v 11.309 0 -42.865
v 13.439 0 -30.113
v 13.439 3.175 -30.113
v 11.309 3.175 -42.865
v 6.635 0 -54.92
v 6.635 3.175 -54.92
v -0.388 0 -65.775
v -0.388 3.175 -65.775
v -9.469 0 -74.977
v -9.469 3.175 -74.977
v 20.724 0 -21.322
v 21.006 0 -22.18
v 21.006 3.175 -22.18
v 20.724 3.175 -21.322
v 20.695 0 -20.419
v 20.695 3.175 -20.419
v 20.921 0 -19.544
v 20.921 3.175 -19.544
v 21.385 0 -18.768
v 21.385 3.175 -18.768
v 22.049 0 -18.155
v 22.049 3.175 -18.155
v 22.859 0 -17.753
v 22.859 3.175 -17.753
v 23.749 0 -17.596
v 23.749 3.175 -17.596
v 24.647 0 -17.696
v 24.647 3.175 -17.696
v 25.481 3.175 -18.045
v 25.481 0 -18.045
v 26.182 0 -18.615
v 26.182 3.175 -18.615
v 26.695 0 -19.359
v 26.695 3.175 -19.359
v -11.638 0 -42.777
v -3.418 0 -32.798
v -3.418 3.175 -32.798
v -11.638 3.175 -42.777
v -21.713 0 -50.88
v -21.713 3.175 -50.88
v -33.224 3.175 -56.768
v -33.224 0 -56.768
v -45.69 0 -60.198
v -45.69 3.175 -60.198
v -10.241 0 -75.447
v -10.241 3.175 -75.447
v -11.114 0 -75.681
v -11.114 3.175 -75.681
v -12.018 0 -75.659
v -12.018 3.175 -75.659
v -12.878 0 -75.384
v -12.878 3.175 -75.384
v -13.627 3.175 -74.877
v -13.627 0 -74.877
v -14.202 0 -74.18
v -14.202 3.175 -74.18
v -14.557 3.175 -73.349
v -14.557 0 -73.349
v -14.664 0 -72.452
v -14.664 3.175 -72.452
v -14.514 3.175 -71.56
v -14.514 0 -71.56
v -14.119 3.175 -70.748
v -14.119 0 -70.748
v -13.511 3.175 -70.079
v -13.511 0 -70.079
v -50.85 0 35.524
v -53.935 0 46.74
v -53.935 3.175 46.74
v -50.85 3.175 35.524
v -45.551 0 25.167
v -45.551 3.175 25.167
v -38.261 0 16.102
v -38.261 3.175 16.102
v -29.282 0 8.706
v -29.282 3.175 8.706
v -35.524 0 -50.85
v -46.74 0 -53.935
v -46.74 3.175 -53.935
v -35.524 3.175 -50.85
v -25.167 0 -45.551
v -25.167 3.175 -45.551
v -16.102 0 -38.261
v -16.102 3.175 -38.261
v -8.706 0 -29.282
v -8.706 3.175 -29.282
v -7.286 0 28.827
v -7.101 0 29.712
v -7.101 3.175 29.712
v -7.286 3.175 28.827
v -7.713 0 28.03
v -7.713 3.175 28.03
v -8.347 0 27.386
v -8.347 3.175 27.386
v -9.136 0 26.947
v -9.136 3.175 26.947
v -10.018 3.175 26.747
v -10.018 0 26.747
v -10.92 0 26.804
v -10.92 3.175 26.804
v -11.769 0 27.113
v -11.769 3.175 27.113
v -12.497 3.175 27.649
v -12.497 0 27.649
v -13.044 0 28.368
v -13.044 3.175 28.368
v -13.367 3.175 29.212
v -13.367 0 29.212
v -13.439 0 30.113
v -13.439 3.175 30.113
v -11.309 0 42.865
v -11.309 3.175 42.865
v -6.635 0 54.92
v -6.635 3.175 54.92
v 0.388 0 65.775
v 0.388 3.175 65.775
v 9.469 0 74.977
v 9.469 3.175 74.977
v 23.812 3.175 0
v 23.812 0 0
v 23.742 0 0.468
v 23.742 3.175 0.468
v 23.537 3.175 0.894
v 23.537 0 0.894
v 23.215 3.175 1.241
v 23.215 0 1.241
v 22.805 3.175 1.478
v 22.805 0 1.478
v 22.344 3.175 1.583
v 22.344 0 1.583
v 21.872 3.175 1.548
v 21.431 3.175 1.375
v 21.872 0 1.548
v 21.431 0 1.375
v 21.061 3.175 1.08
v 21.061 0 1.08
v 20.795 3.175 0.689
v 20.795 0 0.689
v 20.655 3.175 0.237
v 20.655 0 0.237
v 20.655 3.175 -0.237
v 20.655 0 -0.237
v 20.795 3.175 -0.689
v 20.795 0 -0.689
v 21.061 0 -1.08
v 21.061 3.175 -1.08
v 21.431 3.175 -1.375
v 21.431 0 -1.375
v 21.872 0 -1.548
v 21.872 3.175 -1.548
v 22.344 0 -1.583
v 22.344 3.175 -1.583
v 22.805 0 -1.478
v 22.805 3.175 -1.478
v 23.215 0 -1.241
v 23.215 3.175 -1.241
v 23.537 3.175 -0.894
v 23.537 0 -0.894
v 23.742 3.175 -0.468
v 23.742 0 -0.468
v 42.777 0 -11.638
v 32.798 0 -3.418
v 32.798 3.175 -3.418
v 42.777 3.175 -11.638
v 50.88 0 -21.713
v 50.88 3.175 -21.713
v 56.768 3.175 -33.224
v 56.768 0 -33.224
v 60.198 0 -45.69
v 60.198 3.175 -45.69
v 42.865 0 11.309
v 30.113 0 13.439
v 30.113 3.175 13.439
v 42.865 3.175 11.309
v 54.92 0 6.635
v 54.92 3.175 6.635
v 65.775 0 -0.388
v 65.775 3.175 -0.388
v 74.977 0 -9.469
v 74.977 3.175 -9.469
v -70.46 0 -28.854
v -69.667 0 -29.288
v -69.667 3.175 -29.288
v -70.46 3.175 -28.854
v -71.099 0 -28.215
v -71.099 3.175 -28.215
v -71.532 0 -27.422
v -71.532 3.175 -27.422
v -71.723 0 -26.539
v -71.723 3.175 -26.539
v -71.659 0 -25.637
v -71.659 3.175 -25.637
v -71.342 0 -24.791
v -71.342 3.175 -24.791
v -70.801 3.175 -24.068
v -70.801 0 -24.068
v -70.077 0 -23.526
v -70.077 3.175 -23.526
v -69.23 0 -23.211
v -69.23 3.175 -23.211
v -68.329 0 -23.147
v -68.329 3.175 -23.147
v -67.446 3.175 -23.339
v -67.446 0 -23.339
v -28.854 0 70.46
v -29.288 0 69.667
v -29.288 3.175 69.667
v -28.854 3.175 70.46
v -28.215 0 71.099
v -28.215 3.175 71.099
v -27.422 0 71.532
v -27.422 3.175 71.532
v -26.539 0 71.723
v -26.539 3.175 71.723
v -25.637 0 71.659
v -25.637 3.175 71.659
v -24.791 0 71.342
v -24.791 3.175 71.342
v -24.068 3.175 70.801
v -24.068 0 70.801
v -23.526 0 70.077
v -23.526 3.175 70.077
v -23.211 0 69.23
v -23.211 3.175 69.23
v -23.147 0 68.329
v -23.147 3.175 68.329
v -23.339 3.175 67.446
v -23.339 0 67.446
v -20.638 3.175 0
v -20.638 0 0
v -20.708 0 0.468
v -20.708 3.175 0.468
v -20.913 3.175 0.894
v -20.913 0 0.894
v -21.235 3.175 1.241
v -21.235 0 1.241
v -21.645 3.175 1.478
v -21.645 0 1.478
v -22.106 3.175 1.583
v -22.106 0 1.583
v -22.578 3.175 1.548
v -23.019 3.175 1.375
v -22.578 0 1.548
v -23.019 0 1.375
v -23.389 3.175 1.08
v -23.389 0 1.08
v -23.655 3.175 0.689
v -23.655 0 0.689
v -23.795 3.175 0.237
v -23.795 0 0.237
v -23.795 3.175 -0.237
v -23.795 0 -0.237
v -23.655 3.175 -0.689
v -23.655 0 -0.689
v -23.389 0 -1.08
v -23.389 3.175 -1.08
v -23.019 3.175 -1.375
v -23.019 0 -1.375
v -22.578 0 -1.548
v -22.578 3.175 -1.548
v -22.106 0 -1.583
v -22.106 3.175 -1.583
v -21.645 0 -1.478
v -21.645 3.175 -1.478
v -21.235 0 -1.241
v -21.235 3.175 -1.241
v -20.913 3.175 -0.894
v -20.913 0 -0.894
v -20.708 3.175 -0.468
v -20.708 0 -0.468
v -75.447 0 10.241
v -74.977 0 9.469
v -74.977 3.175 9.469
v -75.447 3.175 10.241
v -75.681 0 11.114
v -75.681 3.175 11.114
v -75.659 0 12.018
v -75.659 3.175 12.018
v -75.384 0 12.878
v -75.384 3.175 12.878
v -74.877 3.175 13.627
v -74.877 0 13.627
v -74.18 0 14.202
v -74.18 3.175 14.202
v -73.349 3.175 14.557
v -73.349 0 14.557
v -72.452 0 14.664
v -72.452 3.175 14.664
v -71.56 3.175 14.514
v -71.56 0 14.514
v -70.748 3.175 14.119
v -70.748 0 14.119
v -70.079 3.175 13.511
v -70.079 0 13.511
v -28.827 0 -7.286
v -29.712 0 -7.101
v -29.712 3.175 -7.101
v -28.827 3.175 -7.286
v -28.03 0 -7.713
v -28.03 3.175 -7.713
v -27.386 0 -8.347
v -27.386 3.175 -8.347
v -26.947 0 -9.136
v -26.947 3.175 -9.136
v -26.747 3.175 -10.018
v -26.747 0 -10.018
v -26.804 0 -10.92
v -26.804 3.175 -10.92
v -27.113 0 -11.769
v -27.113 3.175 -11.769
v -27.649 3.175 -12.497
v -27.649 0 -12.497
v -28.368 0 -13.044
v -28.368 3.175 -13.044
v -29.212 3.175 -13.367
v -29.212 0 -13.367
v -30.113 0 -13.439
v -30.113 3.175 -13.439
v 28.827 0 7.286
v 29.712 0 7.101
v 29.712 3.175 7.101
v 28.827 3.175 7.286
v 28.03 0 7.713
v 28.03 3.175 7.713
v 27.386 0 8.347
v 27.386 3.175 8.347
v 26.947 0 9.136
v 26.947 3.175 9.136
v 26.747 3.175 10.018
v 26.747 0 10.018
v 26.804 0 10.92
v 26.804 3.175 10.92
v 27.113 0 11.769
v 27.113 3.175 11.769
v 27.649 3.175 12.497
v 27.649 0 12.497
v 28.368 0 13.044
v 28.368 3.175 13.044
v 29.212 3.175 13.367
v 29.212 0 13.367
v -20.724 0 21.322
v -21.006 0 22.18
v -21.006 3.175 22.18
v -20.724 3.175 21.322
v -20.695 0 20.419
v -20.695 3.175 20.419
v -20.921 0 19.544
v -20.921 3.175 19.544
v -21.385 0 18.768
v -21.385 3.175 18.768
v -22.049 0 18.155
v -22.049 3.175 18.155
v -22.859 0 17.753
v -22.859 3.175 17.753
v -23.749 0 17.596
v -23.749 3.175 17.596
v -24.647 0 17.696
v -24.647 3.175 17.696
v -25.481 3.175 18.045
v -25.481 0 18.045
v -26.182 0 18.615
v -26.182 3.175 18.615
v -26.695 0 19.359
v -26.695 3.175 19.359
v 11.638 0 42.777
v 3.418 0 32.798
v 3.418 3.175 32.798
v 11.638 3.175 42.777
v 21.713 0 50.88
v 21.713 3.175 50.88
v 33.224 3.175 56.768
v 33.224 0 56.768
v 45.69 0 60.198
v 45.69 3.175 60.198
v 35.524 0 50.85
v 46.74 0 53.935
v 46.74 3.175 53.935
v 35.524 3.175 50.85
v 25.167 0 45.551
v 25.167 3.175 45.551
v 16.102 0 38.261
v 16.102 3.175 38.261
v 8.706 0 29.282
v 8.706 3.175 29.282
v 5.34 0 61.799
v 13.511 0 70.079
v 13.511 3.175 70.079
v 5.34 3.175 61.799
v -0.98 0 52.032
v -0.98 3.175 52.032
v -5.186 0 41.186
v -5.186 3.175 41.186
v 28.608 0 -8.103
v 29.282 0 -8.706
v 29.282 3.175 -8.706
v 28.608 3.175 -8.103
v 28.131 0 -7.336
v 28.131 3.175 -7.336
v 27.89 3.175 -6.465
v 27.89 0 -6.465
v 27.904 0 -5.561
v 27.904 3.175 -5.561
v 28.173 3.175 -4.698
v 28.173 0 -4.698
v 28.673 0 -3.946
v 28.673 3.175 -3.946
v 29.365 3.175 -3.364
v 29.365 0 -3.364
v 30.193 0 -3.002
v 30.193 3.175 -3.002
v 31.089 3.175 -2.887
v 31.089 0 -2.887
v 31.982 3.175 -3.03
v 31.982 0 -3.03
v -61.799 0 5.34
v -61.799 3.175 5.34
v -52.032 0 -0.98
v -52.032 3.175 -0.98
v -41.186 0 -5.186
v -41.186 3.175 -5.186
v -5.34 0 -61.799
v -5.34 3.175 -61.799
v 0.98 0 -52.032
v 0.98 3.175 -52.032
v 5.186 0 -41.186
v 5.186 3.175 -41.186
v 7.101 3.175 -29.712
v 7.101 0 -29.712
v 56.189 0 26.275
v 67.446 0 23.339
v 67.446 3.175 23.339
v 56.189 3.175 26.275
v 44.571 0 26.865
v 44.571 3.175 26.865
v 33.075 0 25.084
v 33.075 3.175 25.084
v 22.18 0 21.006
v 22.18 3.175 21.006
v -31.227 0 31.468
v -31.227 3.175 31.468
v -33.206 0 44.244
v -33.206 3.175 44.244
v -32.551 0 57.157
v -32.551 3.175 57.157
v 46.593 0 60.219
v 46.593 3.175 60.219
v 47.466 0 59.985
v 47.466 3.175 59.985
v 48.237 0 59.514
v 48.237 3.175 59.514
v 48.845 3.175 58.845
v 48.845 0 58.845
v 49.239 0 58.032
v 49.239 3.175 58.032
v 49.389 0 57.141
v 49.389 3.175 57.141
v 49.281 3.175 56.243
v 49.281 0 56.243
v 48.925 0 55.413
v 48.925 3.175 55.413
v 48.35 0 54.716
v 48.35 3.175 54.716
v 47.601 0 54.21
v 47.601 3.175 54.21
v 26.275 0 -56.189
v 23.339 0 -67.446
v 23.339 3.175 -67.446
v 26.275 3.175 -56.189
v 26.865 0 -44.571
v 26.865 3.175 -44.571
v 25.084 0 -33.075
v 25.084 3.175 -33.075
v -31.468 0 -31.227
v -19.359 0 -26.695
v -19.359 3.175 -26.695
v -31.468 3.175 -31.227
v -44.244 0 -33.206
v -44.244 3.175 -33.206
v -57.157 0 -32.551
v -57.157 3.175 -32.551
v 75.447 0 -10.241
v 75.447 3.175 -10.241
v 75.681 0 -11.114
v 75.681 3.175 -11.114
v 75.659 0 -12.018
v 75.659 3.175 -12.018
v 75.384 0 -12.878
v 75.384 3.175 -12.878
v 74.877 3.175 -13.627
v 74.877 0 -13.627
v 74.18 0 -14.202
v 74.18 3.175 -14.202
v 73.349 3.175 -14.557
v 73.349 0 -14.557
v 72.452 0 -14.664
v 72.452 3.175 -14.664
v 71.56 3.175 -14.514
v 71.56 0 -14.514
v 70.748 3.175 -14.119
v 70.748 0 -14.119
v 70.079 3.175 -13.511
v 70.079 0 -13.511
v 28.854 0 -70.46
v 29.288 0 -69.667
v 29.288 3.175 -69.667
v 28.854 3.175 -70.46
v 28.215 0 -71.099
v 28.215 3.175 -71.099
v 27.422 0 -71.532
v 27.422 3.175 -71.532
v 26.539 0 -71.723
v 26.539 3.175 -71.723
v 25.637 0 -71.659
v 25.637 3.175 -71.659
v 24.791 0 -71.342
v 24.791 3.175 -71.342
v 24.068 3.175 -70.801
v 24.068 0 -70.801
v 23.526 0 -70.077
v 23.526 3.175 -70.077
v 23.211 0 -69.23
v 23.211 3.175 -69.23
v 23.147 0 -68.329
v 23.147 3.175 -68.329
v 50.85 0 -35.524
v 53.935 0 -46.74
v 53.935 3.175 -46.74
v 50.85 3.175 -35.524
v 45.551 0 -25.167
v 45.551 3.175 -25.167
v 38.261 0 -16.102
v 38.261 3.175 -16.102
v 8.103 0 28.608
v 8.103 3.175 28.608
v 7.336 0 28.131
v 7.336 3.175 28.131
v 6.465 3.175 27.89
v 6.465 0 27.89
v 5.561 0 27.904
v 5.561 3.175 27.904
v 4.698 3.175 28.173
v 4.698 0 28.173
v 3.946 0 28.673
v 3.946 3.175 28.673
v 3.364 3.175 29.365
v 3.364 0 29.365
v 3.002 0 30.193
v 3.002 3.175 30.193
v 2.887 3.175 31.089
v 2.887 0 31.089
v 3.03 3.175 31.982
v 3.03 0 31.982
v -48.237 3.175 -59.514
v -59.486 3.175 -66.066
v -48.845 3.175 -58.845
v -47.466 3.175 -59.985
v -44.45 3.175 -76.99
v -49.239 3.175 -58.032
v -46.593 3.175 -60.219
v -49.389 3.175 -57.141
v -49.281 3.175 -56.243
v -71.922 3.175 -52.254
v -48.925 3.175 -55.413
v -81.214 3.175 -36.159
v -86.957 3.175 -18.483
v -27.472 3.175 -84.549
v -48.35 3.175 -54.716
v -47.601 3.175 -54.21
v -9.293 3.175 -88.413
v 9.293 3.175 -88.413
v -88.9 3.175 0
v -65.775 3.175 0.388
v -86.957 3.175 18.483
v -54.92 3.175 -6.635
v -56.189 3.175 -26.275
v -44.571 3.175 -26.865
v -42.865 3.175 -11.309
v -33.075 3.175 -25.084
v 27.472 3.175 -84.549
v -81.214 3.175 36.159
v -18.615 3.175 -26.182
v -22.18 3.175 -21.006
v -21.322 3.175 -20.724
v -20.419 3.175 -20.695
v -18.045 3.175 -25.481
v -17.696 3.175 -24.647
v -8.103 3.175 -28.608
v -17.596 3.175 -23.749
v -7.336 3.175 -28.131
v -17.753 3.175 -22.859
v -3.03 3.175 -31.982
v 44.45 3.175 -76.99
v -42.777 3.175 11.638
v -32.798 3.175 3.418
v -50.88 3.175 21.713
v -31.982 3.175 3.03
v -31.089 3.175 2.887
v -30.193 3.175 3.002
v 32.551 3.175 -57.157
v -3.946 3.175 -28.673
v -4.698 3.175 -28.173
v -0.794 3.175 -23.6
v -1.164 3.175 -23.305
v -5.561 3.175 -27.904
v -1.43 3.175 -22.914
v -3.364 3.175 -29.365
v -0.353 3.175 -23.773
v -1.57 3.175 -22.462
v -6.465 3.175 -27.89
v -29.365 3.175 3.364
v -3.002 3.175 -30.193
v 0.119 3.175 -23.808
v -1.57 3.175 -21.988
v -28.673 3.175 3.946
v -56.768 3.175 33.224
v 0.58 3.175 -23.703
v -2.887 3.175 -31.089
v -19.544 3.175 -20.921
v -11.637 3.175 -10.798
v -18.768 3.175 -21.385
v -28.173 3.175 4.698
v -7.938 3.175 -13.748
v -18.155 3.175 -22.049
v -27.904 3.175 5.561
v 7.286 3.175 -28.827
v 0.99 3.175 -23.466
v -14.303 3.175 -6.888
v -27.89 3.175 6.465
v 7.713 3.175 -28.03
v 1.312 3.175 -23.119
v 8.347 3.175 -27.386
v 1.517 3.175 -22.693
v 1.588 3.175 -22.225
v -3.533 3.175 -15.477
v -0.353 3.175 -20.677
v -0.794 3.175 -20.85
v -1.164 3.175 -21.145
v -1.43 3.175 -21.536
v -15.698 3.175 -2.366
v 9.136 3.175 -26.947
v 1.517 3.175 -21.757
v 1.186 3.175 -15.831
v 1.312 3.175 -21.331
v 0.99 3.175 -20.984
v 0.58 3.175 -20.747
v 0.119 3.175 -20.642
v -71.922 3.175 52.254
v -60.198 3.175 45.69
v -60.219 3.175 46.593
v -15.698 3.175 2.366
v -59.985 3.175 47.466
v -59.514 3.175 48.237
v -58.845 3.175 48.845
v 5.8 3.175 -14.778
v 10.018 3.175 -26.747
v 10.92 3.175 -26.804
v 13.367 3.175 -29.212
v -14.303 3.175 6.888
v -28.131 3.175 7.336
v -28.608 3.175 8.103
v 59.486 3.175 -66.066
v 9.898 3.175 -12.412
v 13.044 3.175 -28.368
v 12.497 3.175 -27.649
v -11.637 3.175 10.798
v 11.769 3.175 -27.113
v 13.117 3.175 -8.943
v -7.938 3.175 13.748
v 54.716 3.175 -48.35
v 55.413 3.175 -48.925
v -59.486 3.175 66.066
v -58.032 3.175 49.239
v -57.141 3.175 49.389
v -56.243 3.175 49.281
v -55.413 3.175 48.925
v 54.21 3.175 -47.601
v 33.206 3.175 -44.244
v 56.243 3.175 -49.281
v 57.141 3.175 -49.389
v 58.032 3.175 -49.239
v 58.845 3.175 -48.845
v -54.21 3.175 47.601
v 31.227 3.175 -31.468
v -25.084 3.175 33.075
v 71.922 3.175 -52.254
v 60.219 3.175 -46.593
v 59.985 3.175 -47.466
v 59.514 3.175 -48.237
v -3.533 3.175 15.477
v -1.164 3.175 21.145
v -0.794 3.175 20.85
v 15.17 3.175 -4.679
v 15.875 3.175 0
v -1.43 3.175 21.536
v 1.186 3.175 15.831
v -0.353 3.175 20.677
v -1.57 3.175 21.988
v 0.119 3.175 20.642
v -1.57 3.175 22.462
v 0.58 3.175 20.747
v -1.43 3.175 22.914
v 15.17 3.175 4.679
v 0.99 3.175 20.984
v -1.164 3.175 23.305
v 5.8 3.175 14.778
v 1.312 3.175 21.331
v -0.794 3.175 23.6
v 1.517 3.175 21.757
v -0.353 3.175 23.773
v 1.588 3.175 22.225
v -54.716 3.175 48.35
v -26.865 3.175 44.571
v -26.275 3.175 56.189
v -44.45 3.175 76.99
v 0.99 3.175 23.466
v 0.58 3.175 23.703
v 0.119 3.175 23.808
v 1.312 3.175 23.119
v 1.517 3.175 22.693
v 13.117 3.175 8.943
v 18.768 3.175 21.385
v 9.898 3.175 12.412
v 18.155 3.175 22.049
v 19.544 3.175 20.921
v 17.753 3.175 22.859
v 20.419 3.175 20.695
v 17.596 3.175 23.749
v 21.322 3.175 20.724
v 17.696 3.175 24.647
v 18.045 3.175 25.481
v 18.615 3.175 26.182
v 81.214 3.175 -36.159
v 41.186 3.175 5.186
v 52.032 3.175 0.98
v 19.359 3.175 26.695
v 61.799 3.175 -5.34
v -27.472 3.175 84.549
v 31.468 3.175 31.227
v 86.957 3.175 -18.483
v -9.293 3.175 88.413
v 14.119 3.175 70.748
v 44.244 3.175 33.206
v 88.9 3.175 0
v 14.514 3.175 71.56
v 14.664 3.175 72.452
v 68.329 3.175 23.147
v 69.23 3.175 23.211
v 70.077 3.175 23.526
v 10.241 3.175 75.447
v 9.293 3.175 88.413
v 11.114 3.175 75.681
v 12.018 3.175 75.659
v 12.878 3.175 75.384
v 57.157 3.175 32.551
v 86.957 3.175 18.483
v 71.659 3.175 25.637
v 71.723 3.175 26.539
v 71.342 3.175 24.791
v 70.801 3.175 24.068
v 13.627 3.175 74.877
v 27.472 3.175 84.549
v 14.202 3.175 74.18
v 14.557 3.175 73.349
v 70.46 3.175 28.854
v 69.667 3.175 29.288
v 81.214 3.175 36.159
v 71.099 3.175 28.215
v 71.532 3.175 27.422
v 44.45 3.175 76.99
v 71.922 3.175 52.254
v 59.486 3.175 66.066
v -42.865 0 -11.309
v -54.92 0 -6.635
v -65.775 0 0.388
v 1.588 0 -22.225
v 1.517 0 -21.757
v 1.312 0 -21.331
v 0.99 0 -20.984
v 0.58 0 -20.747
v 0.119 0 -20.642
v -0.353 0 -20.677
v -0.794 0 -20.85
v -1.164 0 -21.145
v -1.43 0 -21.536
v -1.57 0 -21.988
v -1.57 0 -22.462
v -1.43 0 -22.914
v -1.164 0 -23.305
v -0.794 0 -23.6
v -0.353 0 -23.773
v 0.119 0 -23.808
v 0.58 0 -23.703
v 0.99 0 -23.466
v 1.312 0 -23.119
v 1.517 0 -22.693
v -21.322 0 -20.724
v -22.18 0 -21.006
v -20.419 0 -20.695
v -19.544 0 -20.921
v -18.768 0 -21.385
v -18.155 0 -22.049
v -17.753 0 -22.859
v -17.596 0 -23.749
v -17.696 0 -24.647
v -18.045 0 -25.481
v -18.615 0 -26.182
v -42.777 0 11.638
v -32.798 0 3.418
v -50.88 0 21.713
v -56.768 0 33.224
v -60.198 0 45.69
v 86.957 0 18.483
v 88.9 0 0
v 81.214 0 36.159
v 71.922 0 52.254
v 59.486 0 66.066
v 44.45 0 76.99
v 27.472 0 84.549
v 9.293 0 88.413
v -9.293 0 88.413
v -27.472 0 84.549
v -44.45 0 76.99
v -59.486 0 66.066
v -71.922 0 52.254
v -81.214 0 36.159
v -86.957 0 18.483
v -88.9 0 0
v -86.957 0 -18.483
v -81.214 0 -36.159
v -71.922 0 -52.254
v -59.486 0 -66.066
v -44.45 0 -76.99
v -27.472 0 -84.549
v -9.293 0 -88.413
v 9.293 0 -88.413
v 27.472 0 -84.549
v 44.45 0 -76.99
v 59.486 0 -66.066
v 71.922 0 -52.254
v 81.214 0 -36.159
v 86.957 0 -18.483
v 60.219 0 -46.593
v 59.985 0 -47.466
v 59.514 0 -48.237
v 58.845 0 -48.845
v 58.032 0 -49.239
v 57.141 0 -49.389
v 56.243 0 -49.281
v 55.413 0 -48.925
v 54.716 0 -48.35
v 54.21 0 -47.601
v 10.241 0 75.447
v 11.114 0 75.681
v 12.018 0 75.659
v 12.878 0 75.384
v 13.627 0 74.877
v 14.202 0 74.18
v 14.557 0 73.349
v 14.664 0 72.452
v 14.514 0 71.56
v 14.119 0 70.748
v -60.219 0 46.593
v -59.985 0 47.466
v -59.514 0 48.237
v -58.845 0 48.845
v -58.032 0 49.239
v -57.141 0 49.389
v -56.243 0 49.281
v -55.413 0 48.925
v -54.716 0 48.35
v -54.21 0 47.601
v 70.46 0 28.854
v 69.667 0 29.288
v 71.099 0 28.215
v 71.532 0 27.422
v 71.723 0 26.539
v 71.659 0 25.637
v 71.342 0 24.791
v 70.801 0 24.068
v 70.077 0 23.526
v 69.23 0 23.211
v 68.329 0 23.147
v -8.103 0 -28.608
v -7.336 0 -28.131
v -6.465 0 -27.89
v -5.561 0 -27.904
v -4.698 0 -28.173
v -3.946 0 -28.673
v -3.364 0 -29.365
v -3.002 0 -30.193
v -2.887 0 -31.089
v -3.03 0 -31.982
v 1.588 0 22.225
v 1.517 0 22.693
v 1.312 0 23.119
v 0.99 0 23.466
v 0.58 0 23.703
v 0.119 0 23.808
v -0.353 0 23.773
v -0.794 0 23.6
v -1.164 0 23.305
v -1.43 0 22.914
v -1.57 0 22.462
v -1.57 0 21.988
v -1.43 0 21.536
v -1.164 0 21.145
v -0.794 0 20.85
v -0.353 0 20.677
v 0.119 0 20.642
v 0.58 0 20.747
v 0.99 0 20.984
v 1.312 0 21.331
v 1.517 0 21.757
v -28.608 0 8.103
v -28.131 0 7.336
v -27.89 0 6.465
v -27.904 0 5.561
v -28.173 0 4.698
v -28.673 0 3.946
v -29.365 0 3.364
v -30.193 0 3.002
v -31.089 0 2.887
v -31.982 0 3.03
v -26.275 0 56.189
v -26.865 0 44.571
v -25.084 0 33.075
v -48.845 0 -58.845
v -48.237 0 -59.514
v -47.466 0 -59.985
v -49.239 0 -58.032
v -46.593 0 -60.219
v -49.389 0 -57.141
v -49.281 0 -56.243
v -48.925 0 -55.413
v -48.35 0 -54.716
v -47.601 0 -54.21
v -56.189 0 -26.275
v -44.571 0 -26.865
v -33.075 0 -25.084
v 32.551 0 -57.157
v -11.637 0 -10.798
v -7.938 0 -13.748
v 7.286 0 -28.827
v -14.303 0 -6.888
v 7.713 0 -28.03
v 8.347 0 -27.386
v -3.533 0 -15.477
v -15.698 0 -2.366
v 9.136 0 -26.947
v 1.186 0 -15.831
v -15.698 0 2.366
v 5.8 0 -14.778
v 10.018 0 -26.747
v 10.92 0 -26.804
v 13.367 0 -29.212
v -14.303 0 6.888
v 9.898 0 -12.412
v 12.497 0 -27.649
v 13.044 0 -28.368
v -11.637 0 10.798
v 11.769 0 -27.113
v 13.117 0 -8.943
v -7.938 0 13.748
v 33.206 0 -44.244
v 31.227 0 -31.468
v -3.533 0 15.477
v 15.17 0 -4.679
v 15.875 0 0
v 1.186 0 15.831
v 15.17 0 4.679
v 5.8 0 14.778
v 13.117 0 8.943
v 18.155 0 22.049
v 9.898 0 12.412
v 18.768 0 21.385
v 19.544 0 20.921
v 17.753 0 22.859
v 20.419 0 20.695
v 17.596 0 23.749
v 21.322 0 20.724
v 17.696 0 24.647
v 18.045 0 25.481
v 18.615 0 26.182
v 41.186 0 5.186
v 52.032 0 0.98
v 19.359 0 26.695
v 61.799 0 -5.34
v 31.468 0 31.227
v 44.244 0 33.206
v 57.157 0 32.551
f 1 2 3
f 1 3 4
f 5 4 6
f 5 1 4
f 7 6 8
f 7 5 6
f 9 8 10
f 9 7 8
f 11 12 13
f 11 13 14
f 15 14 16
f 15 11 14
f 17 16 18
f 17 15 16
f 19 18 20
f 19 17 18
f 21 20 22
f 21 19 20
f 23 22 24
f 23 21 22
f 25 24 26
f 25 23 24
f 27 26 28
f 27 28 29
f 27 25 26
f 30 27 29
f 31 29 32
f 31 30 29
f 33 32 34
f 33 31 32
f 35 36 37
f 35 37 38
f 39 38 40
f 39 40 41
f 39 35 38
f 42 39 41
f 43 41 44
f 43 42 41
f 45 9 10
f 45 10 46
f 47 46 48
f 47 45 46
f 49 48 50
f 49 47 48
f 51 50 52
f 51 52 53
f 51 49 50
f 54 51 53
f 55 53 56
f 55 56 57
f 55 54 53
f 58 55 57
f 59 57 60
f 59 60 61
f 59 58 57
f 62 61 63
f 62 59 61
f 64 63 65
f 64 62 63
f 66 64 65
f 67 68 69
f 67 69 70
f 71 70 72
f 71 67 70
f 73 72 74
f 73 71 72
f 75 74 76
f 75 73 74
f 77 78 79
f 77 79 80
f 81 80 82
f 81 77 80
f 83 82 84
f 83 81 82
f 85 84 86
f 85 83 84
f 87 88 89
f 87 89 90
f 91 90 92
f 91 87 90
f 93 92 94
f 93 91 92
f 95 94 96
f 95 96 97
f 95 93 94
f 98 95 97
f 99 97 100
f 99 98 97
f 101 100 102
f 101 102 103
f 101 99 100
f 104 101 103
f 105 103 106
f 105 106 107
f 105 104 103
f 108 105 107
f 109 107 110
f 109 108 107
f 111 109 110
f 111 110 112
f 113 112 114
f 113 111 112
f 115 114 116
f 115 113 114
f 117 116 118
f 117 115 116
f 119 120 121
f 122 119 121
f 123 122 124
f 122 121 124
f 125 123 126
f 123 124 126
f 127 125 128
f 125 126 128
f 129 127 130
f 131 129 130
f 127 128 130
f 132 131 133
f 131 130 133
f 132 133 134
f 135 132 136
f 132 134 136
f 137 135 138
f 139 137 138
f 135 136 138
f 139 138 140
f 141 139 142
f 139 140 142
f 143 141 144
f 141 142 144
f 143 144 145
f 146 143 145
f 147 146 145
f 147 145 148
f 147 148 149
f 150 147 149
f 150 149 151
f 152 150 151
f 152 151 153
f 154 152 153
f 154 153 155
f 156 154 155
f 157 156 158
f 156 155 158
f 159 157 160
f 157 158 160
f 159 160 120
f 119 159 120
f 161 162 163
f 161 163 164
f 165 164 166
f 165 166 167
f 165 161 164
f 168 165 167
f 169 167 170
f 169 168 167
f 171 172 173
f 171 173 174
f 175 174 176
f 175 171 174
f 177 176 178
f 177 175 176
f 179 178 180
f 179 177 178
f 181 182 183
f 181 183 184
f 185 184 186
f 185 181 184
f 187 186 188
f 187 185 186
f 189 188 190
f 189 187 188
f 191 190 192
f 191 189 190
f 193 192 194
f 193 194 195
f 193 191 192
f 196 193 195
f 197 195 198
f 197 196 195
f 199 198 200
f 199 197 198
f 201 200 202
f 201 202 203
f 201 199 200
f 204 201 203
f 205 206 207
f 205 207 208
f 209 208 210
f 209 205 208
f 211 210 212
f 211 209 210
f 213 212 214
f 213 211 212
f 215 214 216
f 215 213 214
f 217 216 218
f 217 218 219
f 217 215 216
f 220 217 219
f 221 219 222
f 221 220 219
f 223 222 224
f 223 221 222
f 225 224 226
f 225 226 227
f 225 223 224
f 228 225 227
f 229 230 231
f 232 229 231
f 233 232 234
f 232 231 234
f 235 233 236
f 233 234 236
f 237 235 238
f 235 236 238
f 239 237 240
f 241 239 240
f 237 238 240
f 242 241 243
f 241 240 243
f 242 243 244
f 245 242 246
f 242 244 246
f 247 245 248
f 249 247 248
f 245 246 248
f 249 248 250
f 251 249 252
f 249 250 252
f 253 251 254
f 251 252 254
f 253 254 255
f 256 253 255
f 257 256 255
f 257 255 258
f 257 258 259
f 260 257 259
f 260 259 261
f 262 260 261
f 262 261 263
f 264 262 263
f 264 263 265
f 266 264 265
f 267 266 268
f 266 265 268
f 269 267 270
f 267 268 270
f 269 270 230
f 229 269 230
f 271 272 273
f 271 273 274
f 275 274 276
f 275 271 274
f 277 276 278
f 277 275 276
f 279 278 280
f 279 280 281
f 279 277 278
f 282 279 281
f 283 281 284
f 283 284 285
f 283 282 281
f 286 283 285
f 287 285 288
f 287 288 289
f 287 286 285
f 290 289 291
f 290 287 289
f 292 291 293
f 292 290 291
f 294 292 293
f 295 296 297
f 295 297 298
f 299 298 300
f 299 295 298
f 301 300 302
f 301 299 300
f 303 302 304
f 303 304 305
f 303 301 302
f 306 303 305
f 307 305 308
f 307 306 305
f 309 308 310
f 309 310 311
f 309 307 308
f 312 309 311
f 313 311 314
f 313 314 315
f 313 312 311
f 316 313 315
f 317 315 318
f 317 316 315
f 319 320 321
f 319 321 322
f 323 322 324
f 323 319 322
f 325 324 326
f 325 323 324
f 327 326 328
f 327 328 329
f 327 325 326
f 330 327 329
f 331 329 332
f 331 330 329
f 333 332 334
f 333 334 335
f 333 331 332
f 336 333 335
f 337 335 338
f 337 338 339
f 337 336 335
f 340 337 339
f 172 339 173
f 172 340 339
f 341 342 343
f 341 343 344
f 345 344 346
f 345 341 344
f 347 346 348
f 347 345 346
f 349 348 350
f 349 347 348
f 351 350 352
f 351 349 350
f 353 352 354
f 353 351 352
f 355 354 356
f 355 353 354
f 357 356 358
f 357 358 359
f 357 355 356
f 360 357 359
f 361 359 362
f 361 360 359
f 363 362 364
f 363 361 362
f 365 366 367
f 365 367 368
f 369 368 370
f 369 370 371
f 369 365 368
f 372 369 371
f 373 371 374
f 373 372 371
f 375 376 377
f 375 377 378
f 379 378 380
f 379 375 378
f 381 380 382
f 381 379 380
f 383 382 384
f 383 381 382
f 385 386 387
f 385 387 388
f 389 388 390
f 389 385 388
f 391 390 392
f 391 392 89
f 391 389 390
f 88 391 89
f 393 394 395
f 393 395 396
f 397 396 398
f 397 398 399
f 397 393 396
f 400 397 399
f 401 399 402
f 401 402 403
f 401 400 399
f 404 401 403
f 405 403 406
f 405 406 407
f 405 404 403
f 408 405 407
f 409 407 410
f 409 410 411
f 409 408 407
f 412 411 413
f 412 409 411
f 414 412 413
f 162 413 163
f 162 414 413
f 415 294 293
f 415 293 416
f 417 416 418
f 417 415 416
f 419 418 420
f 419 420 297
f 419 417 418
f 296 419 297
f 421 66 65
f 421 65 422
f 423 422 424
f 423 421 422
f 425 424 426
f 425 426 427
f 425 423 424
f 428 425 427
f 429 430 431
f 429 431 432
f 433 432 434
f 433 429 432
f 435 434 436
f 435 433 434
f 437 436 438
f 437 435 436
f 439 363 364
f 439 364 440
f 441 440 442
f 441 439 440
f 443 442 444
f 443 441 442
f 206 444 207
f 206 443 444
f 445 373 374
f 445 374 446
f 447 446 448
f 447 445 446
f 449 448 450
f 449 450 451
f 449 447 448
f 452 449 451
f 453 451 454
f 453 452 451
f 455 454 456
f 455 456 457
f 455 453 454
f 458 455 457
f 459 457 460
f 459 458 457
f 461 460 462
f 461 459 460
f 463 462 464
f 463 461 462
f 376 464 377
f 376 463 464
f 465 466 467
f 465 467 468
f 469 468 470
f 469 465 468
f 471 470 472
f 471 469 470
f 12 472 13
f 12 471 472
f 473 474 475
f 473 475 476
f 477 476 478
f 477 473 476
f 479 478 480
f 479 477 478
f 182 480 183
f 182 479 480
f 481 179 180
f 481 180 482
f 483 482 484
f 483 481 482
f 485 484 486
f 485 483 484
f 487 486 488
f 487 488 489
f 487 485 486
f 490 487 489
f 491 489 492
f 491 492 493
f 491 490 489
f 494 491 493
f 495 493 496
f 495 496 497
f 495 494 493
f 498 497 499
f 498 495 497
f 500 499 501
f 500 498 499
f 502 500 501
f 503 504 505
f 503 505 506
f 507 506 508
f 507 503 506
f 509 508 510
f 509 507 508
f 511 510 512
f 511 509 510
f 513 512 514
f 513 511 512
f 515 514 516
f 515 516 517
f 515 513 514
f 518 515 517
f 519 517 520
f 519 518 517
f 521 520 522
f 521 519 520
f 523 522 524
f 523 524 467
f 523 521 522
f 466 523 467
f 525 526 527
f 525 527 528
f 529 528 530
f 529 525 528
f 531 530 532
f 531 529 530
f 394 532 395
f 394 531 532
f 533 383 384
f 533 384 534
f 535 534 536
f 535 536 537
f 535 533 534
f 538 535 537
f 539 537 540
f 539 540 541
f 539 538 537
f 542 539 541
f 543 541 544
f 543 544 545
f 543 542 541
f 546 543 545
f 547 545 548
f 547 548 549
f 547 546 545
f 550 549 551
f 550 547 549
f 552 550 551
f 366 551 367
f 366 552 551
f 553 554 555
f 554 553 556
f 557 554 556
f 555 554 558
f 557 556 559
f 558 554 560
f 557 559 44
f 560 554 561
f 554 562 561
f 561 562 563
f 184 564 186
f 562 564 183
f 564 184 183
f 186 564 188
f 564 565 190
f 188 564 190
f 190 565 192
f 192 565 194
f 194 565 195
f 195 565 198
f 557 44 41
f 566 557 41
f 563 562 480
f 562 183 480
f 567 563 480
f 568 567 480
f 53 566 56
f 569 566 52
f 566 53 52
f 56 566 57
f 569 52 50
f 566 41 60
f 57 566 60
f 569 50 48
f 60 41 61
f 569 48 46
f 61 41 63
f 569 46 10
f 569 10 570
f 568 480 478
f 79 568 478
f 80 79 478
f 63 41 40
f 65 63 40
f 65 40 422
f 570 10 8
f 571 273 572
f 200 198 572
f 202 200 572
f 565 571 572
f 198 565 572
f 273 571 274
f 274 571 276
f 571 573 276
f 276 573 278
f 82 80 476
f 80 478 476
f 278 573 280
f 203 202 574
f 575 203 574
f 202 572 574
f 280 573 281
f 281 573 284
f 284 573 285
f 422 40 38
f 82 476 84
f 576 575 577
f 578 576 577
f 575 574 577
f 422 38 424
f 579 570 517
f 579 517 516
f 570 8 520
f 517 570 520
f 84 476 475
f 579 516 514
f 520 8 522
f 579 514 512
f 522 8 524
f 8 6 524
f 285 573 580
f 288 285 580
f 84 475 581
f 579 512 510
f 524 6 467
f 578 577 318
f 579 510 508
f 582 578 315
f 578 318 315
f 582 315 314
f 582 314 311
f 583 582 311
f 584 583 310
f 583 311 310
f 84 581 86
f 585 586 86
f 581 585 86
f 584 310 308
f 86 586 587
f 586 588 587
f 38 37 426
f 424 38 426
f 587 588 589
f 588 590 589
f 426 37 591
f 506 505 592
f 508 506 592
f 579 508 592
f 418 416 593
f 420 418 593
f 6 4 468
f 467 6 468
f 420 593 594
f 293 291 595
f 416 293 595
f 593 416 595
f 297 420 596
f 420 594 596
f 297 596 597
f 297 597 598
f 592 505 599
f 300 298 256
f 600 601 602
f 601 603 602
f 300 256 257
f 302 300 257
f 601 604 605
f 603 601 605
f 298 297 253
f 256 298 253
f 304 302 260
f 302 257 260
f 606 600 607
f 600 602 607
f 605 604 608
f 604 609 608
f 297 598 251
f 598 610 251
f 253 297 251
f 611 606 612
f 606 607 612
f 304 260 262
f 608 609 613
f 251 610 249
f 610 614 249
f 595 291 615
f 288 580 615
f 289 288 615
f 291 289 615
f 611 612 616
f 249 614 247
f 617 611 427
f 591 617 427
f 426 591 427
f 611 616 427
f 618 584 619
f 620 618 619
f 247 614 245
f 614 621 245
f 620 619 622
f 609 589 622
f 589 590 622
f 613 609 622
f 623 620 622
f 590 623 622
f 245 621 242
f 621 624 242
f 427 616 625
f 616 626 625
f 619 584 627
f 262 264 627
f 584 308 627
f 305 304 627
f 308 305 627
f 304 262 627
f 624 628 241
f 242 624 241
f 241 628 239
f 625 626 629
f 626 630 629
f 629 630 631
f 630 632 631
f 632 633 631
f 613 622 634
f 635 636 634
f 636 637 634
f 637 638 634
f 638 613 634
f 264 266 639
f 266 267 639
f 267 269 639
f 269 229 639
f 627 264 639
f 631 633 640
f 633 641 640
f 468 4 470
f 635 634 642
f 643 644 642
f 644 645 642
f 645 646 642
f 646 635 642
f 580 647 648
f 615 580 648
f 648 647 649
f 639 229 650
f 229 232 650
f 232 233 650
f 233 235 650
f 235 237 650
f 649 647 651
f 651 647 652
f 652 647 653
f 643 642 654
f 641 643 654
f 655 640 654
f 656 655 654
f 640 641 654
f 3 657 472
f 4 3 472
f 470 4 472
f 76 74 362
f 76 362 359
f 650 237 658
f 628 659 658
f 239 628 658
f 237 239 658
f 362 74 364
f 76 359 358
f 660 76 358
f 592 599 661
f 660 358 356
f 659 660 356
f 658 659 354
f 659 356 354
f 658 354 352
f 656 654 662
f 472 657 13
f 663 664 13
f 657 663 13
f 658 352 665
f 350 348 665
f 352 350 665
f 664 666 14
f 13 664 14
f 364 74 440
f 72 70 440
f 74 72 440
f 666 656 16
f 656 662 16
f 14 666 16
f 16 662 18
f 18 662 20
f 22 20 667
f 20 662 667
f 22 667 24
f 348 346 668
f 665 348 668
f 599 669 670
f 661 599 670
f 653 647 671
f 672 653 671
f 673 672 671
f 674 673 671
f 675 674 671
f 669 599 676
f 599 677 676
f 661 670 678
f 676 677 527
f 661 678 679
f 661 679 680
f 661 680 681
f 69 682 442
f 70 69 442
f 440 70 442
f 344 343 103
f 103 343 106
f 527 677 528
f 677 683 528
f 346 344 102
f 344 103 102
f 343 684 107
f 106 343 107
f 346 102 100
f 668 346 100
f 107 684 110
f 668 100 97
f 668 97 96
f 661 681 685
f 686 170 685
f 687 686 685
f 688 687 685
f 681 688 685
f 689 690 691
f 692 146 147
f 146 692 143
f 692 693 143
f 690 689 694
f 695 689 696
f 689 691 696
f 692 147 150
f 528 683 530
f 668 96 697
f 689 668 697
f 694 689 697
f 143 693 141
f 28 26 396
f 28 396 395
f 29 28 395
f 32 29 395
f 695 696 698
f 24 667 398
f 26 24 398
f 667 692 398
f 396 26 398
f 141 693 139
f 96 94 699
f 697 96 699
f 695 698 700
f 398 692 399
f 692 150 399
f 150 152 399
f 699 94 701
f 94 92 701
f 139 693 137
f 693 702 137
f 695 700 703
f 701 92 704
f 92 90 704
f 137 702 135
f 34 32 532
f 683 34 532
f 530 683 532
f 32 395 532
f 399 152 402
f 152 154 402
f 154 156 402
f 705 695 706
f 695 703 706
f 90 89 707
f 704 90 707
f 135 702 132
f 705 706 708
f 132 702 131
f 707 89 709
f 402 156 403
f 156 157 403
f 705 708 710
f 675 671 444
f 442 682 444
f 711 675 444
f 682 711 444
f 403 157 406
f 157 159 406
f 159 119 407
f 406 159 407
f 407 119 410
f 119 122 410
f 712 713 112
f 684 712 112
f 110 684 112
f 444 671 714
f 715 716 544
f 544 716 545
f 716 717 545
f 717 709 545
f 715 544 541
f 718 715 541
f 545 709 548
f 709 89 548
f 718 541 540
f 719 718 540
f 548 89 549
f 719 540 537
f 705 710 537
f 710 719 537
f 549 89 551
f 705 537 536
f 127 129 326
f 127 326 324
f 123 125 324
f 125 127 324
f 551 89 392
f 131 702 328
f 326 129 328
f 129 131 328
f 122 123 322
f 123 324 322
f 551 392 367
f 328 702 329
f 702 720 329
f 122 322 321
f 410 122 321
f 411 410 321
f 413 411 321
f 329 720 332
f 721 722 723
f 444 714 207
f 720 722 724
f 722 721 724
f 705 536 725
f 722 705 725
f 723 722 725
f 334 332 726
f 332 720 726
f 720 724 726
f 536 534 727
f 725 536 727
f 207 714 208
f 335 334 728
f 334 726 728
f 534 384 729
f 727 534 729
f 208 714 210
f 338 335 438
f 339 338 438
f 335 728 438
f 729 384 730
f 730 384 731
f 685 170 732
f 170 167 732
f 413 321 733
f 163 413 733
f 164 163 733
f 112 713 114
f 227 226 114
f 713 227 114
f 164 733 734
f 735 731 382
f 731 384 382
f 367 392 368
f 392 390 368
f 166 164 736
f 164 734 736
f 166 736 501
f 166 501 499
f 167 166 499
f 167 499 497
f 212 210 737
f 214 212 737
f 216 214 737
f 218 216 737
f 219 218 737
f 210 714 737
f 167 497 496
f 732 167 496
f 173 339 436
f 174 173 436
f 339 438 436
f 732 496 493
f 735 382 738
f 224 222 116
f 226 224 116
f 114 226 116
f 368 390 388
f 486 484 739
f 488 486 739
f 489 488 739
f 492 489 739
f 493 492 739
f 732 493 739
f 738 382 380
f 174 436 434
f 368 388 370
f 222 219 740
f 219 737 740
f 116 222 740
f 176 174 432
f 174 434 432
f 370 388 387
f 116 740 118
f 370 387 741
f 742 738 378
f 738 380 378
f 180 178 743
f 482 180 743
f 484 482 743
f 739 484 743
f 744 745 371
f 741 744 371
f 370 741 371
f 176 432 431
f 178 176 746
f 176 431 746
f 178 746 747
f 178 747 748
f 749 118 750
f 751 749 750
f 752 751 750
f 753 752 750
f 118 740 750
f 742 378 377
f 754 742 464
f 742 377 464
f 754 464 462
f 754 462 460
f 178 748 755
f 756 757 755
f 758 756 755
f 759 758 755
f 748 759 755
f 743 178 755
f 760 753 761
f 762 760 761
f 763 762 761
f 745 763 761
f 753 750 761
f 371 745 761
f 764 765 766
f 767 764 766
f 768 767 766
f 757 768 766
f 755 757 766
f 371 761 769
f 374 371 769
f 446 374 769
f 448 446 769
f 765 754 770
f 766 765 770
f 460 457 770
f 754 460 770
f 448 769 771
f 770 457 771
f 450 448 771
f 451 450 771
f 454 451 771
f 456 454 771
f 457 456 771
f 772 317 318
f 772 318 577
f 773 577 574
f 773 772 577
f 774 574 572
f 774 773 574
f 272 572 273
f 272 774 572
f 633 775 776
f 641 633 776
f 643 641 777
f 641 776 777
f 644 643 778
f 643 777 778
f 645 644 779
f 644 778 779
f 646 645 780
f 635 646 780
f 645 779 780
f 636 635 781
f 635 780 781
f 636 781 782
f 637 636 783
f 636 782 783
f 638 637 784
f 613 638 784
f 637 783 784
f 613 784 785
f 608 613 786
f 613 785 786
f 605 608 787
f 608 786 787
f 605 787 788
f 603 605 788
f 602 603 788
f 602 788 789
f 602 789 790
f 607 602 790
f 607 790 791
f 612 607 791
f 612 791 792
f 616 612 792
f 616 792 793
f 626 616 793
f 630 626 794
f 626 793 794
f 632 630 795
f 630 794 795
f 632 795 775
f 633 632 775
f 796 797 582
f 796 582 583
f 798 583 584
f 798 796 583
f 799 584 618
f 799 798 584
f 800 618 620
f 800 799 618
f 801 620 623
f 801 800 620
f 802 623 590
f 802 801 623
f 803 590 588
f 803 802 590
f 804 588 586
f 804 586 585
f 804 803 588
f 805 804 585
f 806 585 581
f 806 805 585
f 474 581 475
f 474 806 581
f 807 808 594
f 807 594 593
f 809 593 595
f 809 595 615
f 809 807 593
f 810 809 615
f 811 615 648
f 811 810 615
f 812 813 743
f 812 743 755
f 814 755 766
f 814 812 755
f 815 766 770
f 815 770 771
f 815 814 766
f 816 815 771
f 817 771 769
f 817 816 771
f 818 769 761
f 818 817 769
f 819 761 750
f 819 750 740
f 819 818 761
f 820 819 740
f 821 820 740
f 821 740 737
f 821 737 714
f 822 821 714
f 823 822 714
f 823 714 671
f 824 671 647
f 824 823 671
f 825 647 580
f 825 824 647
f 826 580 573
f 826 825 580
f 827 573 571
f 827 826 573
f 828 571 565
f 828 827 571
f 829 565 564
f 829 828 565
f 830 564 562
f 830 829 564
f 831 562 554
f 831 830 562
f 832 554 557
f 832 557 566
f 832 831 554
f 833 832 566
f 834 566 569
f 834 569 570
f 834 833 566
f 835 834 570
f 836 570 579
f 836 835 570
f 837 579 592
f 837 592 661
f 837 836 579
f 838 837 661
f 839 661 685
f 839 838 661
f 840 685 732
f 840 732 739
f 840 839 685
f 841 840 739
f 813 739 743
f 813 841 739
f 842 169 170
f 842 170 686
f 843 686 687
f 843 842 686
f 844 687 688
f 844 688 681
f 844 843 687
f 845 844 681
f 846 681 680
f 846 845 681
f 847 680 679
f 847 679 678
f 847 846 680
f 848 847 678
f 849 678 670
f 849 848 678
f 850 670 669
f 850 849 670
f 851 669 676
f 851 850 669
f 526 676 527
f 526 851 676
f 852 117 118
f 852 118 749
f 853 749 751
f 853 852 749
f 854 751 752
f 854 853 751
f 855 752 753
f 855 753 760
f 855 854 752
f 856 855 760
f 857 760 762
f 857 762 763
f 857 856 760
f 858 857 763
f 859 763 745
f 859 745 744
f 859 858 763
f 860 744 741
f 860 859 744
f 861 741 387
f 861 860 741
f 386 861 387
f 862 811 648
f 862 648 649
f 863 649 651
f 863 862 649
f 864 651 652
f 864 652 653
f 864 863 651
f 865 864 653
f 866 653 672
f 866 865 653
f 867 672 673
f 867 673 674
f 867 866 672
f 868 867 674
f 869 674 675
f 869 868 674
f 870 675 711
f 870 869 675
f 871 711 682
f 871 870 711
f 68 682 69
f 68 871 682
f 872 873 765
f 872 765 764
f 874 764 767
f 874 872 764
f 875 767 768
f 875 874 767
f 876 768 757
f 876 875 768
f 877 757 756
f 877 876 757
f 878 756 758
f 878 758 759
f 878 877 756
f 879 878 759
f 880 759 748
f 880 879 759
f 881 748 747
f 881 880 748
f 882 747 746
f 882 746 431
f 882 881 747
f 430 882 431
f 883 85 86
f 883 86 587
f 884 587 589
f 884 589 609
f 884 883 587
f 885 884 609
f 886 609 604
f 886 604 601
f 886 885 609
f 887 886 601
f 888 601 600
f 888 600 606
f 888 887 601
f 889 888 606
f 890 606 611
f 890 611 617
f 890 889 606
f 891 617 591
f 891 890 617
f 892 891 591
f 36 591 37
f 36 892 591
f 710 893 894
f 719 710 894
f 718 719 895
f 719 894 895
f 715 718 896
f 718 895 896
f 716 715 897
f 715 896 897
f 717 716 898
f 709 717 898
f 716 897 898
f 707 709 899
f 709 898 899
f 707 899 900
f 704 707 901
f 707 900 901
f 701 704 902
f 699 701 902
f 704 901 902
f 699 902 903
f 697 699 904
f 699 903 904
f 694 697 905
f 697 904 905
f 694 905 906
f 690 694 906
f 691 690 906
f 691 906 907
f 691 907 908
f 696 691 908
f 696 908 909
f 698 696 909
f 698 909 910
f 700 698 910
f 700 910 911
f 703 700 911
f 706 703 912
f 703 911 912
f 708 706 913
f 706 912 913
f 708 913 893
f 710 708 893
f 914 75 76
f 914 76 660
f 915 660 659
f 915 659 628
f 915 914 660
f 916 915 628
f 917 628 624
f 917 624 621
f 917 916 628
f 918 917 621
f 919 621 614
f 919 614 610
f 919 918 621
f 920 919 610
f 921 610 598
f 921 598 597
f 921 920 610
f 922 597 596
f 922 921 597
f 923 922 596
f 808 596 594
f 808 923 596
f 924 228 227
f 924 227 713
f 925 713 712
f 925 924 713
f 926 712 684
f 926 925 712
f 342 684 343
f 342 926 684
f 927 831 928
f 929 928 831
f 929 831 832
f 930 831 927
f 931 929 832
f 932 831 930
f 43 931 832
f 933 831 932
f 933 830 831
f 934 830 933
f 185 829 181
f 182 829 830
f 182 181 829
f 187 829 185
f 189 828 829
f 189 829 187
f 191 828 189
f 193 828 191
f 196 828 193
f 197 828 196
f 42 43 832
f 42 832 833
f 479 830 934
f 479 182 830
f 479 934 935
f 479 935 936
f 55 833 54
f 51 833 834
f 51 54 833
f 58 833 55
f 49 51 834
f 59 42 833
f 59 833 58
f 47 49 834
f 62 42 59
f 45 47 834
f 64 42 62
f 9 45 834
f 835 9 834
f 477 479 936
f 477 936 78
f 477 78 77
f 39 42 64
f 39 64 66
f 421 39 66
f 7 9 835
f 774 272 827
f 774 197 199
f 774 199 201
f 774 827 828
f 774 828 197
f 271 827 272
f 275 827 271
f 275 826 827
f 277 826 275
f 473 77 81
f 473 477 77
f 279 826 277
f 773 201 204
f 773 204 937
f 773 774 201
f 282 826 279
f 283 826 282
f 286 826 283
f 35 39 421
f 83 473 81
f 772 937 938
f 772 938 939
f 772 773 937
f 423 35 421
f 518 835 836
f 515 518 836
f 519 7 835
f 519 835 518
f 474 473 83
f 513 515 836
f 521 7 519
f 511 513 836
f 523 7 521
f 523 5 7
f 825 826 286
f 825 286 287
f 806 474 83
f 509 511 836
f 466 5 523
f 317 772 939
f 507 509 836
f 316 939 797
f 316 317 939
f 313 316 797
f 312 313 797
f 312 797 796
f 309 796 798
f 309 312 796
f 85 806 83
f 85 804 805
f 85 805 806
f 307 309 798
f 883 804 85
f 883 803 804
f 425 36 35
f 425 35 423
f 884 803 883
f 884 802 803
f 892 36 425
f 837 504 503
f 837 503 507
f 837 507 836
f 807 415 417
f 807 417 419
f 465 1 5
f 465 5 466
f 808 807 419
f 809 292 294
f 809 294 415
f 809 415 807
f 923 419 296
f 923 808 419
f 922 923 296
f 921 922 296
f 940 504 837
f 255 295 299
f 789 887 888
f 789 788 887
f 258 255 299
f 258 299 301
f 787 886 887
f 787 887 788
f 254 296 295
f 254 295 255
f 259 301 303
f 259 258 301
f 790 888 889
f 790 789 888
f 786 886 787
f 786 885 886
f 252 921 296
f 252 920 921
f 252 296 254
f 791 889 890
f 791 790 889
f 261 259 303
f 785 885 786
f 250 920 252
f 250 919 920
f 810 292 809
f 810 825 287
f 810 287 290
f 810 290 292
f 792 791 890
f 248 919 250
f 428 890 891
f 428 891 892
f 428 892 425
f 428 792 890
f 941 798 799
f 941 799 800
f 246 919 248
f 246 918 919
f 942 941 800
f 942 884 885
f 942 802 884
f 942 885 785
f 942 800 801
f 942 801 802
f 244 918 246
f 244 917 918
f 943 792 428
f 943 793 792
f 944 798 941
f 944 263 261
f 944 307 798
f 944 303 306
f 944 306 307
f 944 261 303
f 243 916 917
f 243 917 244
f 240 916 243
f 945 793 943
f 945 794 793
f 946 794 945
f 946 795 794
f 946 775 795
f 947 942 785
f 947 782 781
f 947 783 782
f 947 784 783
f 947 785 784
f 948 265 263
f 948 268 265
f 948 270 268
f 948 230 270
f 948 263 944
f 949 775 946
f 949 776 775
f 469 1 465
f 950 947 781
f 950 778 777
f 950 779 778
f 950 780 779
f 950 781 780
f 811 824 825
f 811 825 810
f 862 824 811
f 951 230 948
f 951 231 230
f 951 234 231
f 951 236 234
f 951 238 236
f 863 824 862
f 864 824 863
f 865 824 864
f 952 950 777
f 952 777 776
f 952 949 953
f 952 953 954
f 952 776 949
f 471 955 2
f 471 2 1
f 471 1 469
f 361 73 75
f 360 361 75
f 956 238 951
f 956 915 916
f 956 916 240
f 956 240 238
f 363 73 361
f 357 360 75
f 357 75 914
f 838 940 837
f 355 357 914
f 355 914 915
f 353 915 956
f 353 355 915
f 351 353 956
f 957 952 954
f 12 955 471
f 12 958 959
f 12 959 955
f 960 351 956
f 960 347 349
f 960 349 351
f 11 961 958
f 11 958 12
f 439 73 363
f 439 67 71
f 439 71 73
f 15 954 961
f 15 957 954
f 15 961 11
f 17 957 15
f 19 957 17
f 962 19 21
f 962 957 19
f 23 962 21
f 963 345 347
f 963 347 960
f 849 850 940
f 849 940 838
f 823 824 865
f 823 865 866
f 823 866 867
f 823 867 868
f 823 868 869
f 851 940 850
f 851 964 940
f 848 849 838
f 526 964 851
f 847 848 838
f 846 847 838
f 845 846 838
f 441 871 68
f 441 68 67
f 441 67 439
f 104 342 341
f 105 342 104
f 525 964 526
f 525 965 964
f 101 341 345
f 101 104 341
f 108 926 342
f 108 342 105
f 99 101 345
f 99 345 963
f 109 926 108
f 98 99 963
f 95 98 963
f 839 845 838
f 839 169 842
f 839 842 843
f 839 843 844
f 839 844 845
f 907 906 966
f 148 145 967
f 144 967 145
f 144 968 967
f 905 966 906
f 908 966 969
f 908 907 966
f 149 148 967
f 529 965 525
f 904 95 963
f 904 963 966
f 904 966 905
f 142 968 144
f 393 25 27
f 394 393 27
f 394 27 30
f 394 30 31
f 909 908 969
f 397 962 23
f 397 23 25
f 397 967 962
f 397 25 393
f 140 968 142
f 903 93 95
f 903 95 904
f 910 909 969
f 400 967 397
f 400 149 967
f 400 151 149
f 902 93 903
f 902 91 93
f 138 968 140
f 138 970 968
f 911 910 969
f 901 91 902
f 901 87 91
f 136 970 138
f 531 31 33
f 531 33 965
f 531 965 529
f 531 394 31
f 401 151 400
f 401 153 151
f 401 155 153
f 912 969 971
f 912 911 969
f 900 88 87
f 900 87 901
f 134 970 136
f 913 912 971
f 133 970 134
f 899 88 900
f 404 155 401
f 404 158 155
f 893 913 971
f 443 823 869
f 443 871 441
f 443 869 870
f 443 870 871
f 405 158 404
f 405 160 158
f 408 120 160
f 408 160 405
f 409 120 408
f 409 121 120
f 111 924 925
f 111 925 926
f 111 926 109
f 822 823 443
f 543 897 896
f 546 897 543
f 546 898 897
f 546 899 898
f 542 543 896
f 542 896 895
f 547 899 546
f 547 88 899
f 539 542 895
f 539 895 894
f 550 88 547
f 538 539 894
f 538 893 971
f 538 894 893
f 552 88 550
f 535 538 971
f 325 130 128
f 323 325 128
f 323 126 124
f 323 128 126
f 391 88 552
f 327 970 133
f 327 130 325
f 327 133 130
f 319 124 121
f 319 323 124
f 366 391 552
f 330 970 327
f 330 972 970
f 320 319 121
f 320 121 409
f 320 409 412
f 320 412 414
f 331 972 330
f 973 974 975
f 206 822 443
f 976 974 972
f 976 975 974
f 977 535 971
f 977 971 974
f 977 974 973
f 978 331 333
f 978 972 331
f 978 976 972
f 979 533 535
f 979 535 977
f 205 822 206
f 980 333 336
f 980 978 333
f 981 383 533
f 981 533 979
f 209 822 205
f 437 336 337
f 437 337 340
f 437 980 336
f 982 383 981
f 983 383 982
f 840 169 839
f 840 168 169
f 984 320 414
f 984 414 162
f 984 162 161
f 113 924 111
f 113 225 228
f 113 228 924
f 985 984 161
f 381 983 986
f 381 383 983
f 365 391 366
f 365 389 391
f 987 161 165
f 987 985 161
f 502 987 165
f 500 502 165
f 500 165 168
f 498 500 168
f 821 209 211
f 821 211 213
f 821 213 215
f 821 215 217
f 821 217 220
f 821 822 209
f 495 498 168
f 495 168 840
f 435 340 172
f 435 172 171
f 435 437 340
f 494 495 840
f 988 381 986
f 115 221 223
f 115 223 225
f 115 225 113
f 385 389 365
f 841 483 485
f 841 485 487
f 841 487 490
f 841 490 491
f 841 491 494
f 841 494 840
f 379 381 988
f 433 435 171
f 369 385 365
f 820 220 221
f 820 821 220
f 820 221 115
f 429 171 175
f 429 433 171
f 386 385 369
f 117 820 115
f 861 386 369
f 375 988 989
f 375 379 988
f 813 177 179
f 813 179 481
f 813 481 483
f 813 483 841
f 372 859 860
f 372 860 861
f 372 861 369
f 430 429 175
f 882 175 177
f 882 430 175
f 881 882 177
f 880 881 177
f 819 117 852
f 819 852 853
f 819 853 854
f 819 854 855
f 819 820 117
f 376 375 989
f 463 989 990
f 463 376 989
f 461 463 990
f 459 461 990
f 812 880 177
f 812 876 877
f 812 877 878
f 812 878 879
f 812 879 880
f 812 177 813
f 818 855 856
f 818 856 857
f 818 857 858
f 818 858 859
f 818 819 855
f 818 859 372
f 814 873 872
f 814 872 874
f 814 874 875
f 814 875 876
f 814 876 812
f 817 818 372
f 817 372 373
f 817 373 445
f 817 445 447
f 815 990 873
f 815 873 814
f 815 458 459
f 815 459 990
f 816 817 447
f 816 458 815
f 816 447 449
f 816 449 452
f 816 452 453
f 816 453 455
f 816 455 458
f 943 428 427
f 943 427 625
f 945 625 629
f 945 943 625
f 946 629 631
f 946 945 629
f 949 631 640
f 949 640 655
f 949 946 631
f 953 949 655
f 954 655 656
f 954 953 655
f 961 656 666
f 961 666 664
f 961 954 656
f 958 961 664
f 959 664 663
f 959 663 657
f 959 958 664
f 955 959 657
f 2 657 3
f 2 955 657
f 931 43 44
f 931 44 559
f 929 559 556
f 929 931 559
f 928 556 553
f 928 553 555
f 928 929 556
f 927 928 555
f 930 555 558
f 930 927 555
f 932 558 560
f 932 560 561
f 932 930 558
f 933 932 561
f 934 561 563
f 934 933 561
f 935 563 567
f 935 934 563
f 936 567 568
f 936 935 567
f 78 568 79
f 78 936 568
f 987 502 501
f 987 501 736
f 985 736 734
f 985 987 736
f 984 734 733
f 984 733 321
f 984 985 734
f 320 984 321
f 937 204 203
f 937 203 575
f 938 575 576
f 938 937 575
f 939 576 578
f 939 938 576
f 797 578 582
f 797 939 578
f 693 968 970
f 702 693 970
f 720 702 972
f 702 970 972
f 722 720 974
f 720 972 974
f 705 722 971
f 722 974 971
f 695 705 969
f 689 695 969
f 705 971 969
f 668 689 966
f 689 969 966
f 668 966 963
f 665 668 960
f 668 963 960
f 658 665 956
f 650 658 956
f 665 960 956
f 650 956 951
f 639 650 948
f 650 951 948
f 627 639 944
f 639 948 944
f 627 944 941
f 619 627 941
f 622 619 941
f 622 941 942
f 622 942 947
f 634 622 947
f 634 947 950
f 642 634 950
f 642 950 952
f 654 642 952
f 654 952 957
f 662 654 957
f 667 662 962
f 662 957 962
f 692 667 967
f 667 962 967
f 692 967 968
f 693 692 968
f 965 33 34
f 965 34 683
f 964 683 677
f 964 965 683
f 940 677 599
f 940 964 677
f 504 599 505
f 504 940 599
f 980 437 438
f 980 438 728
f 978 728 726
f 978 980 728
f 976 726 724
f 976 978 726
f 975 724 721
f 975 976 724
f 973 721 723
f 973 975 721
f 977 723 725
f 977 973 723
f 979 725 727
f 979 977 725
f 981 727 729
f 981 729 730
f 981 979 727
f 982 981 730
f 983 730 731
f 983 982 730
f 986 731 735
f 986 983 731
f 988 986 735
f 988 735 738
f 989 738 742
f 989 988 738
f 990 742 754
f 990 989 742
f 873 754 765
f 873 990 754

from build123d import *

# Parameters (mm, degrees)
F0_R     = 88.9
F0_R_2   = 1.5875
F0_R_3   = 15.875
F1_DEPTH = 3.175


with BuildPart() as f1:
    # F0 (on Front) → F1 (new body)
    with BuildSketch(Plane.XZ):
        Circle(F0_R)
        with BuildLine():
            ThreePointArc((13.438712, -30.112803), (6.635493, -54.919861), (-9.469491, -74.977364))
            ThreePointArc((-9.469491, -74.977364), (-13.93913, -74.54891), (-13.510676, -70.079271))
            ThreePointArc((-13.510676, -70.079271), (0.98008, -52.032162), (7.101402, -29.711554))
            ThreePointArc((7.101402, -29.711554), (10.470681, -26.743524), (13.438712, -30.112803))
        make_face(mode=Mode.SUBTRACT)
        with BuildLine():
            ThreePointArc((-19.359097, -26.694667), (-44.244249, -33.206436), (-69.667048, -29.287863))
            ThreePointArc((-69.667048, -29.287863), (-71.530815, -25.202814), (-67.445767, -23.339047))
            ThreePointArc((-67.445767, -23.339047), (-44.571135, -26.864855), (-22.18026, -21.005771))
            ThreePointArc((-22.18026, -21.005771), (-17.92523, -22.439638), (-19.359097, -26.694667))
        make_face(mode=Mode.SUBTRACT)
        with BuildLine():
            ThreePointArc((-3.418136, -32.797809), (-21.713426, -50.879741), (-45.689502, -60.197557))
            ThreePointArc((-45.689502, -60.197557), (-49.346096, -57.591685), (-46.740224, -53.935091))
            ThreePointArc((-46.740224, -53.935091), (-25.167307, -45.551214), (-8.705783, -29.281662))
            ThreePointArc((-8.705783, -29.281662), (-4.303886, -28.395912), (-3.418136, -32.797809))
        make_face(mode=Mode.SUBTRACT)
        with BuildLine():
            ThreePointArc((26.694667, -19.359097), (33.206436, -44.244249), (29.287863, -69.667048))
            ThreePointArc((29.287863, -69.667048), (25.202814, -71.530815), (23.339047, -67.445767))
            ThreePointArc((23.339047, -67.445767), (26.864855, -44.571135), (21.005771, -22.18026))
            ThreePointArc((21.005771, -22.18026), (22.439638, -17.92523), (26.694667, -19.359097))
        make_face(mode=Mode.SUBTRACT)
        with BuildLine():
            ThreePointArc((32.797809, -3.418136), (50.879741, -21.713426), (60.197557, -45.689502))
            ThreePointArc((60.197557, -45.689502), (57.591685, -49.346096), (53.935091, -46.740224))
            ThreePointArc((53.935091, -46.740224), (45.551214, -25.167307), (29.281662, -8.705783))
            ThreePointArc((29.281662, -8.705783), (28.395912, -4.303886), (32.797809, -3.418136))
        make_face(mode=Mode.SUBTRACT)
        with Locations((0, -22.225)):
            Circle(F0_R_2, mode=Mode.SUBTRACT)
        with BuildLine():
            ThreePointArc((30.112803, 13.438712), (54.919861, 6.635493), (74.977364, -9.469491))
            ThreePointArc((74.977364, -9.469491), (74.54891, -13.93913), (70.079271, -13.510676))
            ThreePointArc((70.079271, -13.510676), (52.032162, 0.98008), (29.711554, 7.101402))
            ThreePointArc((29.711554, 7.101402), (26.743524, 10.470681), (30.112803, 13.438712))
        make_face(mode=Mode.SUBTRACT)
        with BuildLine():
            ThreePointArc((-30.112803, -13.438712), (-54.919861, -6.635493), (-74.977364, 9.469491))
            ThreePointArc((-74.977364, 9.469491), (-74.54891, 13.93913), (-70.079271, 13.510676))
            ThreePointArc((-70.079271, 13.510676), (-52.032162, -0.98008), (-29.711554, -7.101402))
            ThreePointArc((-29.711554, -7.101402), (-26.743524, -10.470681), (-30.112803, -13.438712))
        make_face(mode=Mode.SUBTRACT)
        with Locations((-22.225, 0)):
            Circle(F0_R_2, mode=Mode.SUBTRACT)
        with BuildLine():
            ThreePointArc((-32.797809, 3.418136), (-50.879741, 21.713426), (-60.197557, 45.689502))
            ThreePointArc((-60.197557, 45.689502), (-57.591685, 49.346096), (-53.935091, 46.740224))
            ThreePointArc((-53.935091, 46.740224), (-45.551214, 25.167307), (-29.281662, 8.705783))
            ThreePointArc((-29.281662, 8.705783), (-28.395912, 4.303886), (-32.797809, 3.418136))
        make_face(mode=Mode.SUBTRACT)
        with BuildLine():
            ThreePointArc((-26.694667, 19.359097), (-33.206436, 44.244249), (-29.287863, 69.667048))
            ThreePointArc((-29.287863, 69.667048), (-25.202814, 71.530815), (-23.339047, 67.445767))
            ThreePointArc((-23.339047, 67.445767), (-26.864855, 44.571135), (-21.005771, 22.18026))
            ThreePointArc((-21.005771, 22.18026), (-22.439638, 17.92523), (-26.694667, 19.359097))
        make_face(mode=Mode.SUBTRACT)
        Circle(F0_R_3, mode=Mode.SUBTRACT)
        with Locations((22.225, 0)):
            Circle(F0_R_2, mode=Mode.SUBTRACT)
        with Locations((0, 22.225)):
            Circle(F0_R_2, mode=Mode.SUBTRACT)
        with BuildLine():
            ThreePointArc((3.418136, 32.797809), (21.713426, 50.879741), (45.689502, 60.197557))
            ThreePointArc((45.689502, 60.197557), (49.346096, 57.591685), (46.740224, 53.935091))
            ThreePointArc((46.740224, 53.935091), (25.167307, 45.551214), (8.705783, 29.281662))
            ThreePointArc((8.705783, 29.281662), (4.303886, 28.395912), (3.418136, 32.797809))
        make_face(mode=Mode.SUBTRACT)
        with BuildLine():
            ThreePointArc((19.359097, 26.694667), (44.244249, 33.206436), (69.667048, 29.287863))
            ThreePointArc((69.667048, 29.287863), (71.530815, 25.202814), (67.445767, 23.339047))
            ThreePointArc((67.445767, 23.339047), (44.571135, 26.864855), (22.18026, 21.005771))
            ThreePointArc((22.18026, 21.005771), (17.92523, 22.439638), (19.359097, 26.694667))
        make_face(mode=Mode.SUBTRACT)
        with BuildLine():
            ThreePointArc((-13.438712, 30.112803), (-6.635493, 54.919861), (9.469491, 74.977364))
            ThreePointArc((9.469491, 74.977364), (13.93913, 74.54891), (13.510676, 70.079271))
            ThreePointArc((13.510676, 70.079271), (-0.98008, 52.032162), (-7.101402, 29.711554))
            ThreePointArc((-7.101402, 29.711554), (-10.470681, 26.743524), (-13.438712, 30.112803))
        make_face(mode=Mode.SUBTRACT)
    extrude(amount=-F1_DEPTH)


solid = f1.part
